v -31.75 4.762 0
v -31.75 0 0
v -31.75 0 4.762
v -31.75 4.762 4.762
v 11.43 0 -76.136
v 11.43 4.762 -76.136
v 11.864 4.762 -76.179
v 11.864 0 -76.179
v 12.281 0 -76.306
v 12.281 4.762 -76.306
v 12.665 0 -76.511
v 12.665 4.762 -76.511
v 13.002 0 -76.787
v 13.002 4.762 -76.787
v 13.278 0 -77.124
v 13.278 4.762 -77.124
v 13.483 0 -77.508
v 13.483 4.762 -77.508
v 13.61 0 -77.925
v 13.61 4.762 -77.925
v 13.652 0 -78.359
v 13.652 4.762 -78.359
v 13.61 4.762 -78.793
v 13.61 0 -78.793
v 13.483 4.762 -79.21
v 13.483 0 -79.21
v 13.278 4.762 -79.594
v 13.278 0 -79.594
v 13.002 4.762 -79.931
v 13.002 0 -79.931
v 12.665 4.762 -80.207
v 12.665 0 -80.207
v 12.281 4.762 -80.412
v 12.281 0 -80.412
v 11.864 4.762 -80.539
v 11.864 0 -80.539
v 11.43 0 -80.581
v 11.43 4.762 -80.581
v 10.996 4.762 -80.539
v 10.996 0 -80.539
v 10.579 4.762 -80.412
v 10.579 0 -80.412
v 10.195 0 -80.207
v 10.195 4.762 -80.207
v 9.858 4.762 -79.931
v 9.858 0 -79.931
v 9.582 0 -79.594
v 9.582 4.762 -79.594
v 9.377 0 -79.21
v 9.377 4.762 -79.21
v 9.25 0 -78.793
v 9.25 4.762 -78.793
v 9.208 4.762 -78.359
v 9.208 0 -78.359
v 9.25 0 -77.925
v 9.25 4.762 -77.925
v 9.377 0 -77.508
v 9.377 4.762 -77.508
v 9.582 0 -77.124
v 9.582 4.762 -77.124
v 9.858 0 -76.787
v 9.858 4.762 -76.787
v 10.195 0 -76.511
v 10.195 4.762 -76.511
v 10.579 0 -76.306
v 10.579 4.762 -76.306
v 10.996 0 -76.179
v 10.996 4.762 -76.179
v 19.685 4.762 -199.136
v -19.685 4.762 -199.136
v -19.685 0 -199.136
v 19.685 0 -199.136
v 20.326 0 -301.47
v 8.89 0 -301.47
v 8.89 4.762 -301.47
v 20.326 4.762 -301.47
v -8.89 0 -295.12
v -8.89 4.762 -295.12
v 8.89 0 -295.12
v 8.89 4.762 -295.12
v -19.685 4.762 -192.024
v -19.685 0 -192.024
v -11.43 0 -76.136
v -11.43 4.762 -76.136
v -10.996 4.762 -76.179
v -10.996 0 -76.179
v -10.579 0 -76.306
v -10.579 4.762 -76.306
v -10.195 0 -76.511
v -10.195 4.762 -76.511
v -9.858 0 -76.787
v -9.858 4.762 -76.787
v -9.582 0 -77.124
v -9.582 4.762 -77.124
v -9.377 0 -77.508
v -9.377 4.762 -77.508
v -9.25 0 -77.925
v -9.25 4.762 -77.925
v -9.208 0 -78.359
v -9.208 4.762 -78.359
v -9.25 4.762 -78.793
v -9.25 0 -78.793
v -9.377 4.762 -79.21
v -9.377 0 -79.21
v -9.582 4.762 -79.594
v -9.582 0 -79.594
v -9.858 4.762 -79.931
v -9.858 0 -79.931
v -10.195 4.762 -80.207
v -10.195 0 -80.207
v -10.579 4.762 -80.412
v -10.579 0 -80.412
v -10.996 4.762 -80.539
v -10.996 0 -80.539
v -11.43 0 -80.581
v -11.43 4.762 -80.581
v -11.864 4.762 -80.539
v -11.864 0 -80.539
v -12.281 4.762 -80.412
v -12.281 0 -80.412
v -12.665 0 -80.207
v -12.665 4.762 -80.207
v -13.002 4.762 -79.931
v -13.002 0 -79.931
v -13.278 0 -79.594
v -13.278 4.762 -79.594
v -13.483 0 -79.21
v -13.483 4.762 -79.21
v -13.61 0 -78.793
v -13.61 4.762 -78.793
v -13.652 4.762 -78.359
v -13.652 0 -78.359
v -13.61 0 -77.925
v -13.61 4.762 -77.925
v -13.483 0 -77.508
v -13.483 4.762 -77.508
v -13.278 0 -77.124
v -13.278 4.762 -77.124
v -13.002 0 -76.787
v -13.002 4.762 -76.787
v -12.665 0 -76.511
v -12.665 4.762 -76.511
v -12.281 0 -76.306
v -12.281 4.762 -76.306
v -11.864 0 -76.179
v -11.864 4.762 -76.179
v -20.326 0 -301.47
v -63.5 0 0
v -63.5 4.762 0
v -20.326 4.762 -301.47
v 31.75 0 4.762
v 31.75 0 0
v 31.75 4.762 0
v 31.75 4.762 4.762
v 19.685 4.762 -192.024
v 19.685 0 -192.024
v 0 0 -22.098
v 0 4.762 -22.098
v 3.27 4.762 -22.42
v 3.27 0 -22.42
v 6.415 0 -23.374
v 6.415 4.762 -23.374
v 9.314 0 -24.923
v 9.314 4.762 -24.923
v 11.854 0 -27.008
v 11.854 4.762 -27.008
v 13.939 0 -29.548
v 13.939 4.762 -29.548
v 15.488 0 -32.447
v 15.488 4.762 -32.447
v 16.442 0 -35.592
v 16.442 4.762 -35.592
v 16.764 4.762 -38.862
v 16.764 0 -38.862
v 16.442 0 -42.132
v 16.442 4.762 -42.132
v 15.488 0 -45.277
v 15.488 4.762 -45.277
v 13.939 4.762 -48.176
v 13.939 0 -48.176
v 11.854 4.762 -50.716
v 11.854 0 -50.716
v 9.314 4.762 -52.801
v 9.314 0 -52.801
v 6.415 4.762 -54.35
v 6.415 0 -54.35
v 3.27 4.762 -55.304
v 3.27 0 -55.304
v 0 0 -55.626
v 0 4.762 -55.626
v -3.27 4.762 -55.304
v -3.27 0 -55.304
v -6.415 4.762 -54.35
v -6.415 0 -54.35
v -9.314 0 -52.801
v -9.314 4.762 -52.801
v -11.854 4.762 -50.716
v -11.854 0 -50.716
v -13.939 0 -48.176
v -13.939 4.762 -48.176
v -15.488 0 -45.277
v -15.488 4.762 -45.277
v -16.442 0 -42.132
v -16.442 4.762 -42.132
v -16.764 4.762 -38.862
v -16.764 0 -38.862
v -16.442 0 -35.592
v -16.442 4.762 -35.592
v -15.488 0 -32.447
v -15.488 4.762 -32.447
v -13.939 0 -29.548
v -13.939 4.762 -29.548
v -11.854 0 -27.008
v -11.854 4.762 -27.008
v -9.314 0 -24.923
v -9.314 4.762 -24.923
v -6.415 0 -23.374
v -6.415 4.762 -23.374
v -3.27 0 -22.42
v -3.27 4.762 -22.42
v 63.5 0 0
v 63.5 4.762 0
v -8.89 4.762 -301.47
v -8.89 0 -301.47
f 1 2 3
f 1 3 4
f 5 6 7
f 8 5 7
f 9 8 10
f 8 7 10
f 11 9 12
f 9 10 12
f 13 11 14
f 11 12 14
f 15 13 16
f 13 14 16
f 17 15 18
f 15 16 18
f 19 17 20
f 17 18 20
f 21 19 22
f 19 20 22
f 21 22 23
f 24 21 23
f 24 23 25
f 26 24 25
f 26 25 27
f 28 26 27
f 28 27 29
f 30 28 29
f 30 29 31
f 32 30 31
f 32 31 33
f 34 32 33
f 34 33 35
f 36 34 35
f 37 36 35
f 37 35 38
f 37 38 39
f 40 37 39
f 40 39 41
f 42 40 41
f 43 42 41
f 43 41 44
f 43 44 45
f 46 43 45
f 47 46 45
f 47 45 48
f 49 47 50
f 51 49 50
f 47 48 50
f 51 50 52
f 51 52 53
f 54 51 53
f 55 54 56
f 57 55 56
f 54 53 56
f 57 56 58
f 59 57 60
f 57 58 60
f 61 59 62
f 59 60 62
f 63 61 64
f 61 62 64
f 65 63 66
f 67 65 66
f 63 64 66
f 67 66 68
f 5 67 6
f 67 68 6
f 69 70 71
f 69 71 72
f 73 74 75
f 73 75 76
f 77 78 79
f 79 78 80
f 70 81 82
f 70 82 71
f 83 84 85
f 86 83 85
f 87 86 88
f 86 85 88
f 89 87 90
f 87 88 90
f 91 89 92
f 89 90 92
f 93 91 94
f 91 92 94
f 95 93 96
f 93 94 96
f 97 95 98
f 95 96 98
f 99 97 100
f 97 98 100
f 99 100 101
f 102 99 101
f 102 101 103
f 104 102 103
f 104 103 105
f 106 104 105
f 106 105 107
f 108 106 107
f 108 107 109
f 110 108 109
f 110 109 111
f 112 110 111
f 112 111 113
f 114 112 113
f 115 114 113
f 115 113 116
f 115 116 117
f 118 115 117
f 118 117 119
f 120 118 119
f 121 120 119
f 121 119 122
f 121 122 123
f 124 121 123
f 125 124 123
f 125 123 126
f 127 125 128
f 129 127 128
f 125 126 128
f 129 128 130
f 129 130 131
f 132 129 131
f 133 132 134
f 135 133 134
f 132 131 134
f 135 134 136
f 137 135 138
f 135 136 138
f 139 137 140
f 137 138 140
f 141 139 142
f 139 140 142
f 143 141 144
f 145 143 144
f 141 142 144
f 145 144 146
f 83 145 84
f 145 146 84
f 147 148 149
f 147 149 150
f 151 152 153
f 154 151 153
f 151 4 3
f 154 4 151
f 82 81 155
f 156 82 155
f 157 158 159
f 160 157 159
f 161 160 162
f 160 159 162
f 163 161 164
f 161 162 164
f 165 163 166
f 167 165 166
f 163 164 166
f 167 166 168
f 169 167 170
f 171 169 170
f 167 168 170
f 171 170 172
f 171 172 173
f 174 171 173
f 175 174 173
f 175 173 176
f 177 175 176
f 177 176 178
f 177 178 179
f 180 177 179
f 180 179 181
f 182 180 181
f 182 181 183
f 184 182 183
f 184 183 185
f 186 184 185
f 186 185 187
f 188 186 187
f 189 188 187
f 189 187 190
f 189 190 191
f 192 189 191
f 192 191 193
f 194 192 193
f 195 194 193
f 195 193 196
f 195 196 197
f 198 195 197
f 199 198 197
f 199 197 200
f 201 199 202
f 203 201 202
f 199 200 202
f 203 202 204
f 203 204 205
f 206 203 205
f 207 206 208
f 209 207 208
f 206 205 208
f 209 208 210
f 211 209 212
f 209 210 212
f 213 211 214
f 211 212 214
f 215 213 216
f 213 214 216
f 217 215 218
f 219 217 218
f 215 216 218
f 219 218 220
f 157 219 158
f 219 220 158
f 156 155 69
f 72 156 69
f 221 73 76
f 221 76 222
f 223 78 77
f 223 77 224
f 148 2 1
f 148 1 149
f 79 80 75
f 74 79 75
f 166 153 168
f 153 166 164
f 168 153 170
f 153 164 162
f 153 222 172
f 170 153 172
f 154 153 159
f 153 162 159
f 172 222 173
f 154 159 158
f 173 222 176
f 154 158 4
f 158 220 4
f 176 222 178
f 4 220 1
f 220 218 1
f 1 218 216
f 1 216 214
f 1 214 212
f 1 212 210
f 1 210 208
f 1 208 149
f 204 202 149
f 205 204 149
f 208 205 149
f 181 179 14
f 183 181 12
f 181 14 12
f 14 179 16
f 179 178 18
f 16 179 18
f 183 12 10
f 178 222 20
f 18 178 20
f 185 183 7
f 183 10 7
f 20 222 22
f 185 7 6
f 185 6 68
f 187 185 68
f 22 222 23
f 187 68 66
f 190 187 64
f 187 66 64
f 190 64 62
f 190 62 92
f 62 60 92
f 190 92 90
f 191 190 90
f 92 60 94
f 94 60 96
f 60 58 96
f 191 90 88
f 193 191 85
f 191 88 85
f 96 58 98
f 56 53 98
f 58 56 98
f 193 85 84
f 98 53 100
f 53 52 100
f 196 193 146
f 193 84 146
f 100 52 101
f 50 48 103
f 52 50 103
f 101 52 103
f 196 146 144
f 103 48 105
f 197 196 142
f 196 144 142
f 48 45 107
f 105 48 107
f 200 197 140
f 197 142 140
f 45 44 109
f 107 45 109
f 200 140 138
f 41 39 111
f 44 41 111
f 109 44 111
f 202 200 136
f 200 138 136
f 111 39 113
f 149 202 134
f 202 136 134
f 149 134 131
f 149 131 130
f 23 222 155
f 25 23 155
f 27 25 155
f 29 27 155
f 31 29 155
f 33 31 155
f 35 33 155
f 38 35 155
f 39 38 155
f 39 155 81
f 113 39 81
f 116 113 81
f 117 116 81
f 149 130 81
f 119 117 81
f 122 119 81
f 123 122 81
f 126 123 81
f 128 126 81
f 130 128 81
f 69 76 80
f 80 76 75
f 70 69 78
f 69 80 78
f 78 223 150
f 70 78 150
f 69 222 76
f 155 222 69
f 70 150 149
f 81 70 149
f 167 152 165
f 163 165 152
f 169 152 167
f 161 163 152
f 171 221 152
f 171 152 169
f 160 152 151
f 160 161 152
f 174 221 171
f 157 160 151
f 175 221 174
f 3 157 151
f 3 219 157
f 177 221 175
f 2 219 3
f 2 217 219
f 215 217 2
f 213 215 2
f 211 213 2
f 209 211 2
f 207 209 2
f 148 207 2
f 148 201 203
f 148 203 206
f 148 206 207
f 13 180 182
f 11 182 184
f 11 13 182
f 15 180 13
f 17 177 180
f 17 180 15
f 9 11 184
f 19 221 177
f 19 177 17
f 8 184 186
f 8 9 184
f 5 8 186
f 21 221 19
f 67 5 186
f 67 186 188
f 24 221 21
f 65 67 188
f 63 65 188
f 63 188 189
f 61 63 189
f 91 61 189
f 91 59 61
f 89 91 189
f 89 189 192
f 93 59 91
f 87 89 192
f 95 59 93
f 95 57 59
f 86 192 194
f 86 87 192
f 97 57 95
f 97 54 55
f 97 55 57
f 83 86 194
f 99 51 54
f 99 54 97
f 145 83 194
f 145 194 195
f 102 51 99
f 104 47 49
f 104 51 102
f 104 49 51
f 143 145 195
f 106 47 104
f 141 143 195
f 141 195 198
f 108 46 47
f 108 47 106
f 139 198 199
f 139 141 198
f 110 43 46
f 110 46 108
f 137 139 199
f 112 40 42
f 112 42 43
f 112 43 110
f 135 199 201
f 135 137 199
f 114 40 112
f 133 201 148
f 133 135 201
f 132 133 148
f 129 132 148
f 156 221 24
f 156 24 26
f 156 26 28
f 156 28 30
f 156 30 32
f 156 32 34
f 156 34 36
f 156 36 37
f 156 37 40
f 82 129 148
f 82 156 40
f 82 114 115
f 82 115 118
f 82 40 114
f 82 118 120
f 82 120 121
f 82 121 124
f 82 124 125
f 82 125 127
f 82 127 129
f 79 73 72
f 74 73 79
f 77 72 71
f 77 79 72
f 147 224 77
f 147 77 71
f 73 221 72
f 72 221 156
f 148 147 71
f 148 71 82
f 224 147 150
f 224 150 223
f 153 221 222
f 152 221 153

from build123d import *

# Parameters (mm, degrees)
BOSS_EXTRUDE1_DEPTH = 4.7625
SKETCH2_R           = 16.764
SKETCH2_R_2         = 2.2225
SKETCH2_W           = 17.78
SKETCH2_H           = 6.35
SKETCH2_W_2         = 39.37
SKETCH2_H_2         = 7.112
CUT_EXTRUDE1_DEPTH  = 309.122058256
SKETCH3_W           = 63.5
SKETCH3_H           = 4.7625
BOSS_EXTRUDE2_DEPTH = 4.7625


with BuildPart() as part:
    # Sketch1 → Boss-Extrude1 (new body)
    with BuildSketch(Plane(origin=(0, 0, 0), x_dir=(1, 0, 0), z_dir=(0, 1, 0))):
        Polygon((63.5, 0), (-63.5, 0), (-20.325994648, 301.470183232), (20.325994648, 301.470183232), align=None)
    extrude(amount=BOSS_EXTRUDE1_DEPTH)

    # Sketch2 → Cut-Extrude1 (cut, through all)
    with BuildSketch(Plane(origin=(0, 4.7625, 0), x_dir=(1, 0, 0), z_dir=(0, 1, 0))):
        with Locations(Location((0, 38.862, 0), (0, 0, 270))):
            Circle(SKETCH2_R)
        with Locations(Location((-11.43, 78.359, 0), (0, 0, 270))):
            Circle(SKETCH2_R_2)
        with Locations(Location((11.43, 78.359, 0), (0, 0, 270))):
            Circle(SKETCH2_R_2)
        with Locations((0, 298.295183232)):
            Rectangle(SKETCH2_W, SKETCH2_H)
        with Locations((0, 195.58)):
            Rectangle(SKETCH2_W_2, SKETCH2_H_2)
    extrude(amount=-CUT_EXTRUDE1_DEPTH, mode=Mode.SUBTRACT)

    # Sketch3 → Boss-Extrude2 (add)
    with BuildSketch(Plane.XY):
        with Locations((0, 2.38125)):
            Rectangle(SKETCH3_W, SKETCH3_H)
    extrude(amount=BOSS_EXTRUDE2_DEPTH)


solid = part.part
